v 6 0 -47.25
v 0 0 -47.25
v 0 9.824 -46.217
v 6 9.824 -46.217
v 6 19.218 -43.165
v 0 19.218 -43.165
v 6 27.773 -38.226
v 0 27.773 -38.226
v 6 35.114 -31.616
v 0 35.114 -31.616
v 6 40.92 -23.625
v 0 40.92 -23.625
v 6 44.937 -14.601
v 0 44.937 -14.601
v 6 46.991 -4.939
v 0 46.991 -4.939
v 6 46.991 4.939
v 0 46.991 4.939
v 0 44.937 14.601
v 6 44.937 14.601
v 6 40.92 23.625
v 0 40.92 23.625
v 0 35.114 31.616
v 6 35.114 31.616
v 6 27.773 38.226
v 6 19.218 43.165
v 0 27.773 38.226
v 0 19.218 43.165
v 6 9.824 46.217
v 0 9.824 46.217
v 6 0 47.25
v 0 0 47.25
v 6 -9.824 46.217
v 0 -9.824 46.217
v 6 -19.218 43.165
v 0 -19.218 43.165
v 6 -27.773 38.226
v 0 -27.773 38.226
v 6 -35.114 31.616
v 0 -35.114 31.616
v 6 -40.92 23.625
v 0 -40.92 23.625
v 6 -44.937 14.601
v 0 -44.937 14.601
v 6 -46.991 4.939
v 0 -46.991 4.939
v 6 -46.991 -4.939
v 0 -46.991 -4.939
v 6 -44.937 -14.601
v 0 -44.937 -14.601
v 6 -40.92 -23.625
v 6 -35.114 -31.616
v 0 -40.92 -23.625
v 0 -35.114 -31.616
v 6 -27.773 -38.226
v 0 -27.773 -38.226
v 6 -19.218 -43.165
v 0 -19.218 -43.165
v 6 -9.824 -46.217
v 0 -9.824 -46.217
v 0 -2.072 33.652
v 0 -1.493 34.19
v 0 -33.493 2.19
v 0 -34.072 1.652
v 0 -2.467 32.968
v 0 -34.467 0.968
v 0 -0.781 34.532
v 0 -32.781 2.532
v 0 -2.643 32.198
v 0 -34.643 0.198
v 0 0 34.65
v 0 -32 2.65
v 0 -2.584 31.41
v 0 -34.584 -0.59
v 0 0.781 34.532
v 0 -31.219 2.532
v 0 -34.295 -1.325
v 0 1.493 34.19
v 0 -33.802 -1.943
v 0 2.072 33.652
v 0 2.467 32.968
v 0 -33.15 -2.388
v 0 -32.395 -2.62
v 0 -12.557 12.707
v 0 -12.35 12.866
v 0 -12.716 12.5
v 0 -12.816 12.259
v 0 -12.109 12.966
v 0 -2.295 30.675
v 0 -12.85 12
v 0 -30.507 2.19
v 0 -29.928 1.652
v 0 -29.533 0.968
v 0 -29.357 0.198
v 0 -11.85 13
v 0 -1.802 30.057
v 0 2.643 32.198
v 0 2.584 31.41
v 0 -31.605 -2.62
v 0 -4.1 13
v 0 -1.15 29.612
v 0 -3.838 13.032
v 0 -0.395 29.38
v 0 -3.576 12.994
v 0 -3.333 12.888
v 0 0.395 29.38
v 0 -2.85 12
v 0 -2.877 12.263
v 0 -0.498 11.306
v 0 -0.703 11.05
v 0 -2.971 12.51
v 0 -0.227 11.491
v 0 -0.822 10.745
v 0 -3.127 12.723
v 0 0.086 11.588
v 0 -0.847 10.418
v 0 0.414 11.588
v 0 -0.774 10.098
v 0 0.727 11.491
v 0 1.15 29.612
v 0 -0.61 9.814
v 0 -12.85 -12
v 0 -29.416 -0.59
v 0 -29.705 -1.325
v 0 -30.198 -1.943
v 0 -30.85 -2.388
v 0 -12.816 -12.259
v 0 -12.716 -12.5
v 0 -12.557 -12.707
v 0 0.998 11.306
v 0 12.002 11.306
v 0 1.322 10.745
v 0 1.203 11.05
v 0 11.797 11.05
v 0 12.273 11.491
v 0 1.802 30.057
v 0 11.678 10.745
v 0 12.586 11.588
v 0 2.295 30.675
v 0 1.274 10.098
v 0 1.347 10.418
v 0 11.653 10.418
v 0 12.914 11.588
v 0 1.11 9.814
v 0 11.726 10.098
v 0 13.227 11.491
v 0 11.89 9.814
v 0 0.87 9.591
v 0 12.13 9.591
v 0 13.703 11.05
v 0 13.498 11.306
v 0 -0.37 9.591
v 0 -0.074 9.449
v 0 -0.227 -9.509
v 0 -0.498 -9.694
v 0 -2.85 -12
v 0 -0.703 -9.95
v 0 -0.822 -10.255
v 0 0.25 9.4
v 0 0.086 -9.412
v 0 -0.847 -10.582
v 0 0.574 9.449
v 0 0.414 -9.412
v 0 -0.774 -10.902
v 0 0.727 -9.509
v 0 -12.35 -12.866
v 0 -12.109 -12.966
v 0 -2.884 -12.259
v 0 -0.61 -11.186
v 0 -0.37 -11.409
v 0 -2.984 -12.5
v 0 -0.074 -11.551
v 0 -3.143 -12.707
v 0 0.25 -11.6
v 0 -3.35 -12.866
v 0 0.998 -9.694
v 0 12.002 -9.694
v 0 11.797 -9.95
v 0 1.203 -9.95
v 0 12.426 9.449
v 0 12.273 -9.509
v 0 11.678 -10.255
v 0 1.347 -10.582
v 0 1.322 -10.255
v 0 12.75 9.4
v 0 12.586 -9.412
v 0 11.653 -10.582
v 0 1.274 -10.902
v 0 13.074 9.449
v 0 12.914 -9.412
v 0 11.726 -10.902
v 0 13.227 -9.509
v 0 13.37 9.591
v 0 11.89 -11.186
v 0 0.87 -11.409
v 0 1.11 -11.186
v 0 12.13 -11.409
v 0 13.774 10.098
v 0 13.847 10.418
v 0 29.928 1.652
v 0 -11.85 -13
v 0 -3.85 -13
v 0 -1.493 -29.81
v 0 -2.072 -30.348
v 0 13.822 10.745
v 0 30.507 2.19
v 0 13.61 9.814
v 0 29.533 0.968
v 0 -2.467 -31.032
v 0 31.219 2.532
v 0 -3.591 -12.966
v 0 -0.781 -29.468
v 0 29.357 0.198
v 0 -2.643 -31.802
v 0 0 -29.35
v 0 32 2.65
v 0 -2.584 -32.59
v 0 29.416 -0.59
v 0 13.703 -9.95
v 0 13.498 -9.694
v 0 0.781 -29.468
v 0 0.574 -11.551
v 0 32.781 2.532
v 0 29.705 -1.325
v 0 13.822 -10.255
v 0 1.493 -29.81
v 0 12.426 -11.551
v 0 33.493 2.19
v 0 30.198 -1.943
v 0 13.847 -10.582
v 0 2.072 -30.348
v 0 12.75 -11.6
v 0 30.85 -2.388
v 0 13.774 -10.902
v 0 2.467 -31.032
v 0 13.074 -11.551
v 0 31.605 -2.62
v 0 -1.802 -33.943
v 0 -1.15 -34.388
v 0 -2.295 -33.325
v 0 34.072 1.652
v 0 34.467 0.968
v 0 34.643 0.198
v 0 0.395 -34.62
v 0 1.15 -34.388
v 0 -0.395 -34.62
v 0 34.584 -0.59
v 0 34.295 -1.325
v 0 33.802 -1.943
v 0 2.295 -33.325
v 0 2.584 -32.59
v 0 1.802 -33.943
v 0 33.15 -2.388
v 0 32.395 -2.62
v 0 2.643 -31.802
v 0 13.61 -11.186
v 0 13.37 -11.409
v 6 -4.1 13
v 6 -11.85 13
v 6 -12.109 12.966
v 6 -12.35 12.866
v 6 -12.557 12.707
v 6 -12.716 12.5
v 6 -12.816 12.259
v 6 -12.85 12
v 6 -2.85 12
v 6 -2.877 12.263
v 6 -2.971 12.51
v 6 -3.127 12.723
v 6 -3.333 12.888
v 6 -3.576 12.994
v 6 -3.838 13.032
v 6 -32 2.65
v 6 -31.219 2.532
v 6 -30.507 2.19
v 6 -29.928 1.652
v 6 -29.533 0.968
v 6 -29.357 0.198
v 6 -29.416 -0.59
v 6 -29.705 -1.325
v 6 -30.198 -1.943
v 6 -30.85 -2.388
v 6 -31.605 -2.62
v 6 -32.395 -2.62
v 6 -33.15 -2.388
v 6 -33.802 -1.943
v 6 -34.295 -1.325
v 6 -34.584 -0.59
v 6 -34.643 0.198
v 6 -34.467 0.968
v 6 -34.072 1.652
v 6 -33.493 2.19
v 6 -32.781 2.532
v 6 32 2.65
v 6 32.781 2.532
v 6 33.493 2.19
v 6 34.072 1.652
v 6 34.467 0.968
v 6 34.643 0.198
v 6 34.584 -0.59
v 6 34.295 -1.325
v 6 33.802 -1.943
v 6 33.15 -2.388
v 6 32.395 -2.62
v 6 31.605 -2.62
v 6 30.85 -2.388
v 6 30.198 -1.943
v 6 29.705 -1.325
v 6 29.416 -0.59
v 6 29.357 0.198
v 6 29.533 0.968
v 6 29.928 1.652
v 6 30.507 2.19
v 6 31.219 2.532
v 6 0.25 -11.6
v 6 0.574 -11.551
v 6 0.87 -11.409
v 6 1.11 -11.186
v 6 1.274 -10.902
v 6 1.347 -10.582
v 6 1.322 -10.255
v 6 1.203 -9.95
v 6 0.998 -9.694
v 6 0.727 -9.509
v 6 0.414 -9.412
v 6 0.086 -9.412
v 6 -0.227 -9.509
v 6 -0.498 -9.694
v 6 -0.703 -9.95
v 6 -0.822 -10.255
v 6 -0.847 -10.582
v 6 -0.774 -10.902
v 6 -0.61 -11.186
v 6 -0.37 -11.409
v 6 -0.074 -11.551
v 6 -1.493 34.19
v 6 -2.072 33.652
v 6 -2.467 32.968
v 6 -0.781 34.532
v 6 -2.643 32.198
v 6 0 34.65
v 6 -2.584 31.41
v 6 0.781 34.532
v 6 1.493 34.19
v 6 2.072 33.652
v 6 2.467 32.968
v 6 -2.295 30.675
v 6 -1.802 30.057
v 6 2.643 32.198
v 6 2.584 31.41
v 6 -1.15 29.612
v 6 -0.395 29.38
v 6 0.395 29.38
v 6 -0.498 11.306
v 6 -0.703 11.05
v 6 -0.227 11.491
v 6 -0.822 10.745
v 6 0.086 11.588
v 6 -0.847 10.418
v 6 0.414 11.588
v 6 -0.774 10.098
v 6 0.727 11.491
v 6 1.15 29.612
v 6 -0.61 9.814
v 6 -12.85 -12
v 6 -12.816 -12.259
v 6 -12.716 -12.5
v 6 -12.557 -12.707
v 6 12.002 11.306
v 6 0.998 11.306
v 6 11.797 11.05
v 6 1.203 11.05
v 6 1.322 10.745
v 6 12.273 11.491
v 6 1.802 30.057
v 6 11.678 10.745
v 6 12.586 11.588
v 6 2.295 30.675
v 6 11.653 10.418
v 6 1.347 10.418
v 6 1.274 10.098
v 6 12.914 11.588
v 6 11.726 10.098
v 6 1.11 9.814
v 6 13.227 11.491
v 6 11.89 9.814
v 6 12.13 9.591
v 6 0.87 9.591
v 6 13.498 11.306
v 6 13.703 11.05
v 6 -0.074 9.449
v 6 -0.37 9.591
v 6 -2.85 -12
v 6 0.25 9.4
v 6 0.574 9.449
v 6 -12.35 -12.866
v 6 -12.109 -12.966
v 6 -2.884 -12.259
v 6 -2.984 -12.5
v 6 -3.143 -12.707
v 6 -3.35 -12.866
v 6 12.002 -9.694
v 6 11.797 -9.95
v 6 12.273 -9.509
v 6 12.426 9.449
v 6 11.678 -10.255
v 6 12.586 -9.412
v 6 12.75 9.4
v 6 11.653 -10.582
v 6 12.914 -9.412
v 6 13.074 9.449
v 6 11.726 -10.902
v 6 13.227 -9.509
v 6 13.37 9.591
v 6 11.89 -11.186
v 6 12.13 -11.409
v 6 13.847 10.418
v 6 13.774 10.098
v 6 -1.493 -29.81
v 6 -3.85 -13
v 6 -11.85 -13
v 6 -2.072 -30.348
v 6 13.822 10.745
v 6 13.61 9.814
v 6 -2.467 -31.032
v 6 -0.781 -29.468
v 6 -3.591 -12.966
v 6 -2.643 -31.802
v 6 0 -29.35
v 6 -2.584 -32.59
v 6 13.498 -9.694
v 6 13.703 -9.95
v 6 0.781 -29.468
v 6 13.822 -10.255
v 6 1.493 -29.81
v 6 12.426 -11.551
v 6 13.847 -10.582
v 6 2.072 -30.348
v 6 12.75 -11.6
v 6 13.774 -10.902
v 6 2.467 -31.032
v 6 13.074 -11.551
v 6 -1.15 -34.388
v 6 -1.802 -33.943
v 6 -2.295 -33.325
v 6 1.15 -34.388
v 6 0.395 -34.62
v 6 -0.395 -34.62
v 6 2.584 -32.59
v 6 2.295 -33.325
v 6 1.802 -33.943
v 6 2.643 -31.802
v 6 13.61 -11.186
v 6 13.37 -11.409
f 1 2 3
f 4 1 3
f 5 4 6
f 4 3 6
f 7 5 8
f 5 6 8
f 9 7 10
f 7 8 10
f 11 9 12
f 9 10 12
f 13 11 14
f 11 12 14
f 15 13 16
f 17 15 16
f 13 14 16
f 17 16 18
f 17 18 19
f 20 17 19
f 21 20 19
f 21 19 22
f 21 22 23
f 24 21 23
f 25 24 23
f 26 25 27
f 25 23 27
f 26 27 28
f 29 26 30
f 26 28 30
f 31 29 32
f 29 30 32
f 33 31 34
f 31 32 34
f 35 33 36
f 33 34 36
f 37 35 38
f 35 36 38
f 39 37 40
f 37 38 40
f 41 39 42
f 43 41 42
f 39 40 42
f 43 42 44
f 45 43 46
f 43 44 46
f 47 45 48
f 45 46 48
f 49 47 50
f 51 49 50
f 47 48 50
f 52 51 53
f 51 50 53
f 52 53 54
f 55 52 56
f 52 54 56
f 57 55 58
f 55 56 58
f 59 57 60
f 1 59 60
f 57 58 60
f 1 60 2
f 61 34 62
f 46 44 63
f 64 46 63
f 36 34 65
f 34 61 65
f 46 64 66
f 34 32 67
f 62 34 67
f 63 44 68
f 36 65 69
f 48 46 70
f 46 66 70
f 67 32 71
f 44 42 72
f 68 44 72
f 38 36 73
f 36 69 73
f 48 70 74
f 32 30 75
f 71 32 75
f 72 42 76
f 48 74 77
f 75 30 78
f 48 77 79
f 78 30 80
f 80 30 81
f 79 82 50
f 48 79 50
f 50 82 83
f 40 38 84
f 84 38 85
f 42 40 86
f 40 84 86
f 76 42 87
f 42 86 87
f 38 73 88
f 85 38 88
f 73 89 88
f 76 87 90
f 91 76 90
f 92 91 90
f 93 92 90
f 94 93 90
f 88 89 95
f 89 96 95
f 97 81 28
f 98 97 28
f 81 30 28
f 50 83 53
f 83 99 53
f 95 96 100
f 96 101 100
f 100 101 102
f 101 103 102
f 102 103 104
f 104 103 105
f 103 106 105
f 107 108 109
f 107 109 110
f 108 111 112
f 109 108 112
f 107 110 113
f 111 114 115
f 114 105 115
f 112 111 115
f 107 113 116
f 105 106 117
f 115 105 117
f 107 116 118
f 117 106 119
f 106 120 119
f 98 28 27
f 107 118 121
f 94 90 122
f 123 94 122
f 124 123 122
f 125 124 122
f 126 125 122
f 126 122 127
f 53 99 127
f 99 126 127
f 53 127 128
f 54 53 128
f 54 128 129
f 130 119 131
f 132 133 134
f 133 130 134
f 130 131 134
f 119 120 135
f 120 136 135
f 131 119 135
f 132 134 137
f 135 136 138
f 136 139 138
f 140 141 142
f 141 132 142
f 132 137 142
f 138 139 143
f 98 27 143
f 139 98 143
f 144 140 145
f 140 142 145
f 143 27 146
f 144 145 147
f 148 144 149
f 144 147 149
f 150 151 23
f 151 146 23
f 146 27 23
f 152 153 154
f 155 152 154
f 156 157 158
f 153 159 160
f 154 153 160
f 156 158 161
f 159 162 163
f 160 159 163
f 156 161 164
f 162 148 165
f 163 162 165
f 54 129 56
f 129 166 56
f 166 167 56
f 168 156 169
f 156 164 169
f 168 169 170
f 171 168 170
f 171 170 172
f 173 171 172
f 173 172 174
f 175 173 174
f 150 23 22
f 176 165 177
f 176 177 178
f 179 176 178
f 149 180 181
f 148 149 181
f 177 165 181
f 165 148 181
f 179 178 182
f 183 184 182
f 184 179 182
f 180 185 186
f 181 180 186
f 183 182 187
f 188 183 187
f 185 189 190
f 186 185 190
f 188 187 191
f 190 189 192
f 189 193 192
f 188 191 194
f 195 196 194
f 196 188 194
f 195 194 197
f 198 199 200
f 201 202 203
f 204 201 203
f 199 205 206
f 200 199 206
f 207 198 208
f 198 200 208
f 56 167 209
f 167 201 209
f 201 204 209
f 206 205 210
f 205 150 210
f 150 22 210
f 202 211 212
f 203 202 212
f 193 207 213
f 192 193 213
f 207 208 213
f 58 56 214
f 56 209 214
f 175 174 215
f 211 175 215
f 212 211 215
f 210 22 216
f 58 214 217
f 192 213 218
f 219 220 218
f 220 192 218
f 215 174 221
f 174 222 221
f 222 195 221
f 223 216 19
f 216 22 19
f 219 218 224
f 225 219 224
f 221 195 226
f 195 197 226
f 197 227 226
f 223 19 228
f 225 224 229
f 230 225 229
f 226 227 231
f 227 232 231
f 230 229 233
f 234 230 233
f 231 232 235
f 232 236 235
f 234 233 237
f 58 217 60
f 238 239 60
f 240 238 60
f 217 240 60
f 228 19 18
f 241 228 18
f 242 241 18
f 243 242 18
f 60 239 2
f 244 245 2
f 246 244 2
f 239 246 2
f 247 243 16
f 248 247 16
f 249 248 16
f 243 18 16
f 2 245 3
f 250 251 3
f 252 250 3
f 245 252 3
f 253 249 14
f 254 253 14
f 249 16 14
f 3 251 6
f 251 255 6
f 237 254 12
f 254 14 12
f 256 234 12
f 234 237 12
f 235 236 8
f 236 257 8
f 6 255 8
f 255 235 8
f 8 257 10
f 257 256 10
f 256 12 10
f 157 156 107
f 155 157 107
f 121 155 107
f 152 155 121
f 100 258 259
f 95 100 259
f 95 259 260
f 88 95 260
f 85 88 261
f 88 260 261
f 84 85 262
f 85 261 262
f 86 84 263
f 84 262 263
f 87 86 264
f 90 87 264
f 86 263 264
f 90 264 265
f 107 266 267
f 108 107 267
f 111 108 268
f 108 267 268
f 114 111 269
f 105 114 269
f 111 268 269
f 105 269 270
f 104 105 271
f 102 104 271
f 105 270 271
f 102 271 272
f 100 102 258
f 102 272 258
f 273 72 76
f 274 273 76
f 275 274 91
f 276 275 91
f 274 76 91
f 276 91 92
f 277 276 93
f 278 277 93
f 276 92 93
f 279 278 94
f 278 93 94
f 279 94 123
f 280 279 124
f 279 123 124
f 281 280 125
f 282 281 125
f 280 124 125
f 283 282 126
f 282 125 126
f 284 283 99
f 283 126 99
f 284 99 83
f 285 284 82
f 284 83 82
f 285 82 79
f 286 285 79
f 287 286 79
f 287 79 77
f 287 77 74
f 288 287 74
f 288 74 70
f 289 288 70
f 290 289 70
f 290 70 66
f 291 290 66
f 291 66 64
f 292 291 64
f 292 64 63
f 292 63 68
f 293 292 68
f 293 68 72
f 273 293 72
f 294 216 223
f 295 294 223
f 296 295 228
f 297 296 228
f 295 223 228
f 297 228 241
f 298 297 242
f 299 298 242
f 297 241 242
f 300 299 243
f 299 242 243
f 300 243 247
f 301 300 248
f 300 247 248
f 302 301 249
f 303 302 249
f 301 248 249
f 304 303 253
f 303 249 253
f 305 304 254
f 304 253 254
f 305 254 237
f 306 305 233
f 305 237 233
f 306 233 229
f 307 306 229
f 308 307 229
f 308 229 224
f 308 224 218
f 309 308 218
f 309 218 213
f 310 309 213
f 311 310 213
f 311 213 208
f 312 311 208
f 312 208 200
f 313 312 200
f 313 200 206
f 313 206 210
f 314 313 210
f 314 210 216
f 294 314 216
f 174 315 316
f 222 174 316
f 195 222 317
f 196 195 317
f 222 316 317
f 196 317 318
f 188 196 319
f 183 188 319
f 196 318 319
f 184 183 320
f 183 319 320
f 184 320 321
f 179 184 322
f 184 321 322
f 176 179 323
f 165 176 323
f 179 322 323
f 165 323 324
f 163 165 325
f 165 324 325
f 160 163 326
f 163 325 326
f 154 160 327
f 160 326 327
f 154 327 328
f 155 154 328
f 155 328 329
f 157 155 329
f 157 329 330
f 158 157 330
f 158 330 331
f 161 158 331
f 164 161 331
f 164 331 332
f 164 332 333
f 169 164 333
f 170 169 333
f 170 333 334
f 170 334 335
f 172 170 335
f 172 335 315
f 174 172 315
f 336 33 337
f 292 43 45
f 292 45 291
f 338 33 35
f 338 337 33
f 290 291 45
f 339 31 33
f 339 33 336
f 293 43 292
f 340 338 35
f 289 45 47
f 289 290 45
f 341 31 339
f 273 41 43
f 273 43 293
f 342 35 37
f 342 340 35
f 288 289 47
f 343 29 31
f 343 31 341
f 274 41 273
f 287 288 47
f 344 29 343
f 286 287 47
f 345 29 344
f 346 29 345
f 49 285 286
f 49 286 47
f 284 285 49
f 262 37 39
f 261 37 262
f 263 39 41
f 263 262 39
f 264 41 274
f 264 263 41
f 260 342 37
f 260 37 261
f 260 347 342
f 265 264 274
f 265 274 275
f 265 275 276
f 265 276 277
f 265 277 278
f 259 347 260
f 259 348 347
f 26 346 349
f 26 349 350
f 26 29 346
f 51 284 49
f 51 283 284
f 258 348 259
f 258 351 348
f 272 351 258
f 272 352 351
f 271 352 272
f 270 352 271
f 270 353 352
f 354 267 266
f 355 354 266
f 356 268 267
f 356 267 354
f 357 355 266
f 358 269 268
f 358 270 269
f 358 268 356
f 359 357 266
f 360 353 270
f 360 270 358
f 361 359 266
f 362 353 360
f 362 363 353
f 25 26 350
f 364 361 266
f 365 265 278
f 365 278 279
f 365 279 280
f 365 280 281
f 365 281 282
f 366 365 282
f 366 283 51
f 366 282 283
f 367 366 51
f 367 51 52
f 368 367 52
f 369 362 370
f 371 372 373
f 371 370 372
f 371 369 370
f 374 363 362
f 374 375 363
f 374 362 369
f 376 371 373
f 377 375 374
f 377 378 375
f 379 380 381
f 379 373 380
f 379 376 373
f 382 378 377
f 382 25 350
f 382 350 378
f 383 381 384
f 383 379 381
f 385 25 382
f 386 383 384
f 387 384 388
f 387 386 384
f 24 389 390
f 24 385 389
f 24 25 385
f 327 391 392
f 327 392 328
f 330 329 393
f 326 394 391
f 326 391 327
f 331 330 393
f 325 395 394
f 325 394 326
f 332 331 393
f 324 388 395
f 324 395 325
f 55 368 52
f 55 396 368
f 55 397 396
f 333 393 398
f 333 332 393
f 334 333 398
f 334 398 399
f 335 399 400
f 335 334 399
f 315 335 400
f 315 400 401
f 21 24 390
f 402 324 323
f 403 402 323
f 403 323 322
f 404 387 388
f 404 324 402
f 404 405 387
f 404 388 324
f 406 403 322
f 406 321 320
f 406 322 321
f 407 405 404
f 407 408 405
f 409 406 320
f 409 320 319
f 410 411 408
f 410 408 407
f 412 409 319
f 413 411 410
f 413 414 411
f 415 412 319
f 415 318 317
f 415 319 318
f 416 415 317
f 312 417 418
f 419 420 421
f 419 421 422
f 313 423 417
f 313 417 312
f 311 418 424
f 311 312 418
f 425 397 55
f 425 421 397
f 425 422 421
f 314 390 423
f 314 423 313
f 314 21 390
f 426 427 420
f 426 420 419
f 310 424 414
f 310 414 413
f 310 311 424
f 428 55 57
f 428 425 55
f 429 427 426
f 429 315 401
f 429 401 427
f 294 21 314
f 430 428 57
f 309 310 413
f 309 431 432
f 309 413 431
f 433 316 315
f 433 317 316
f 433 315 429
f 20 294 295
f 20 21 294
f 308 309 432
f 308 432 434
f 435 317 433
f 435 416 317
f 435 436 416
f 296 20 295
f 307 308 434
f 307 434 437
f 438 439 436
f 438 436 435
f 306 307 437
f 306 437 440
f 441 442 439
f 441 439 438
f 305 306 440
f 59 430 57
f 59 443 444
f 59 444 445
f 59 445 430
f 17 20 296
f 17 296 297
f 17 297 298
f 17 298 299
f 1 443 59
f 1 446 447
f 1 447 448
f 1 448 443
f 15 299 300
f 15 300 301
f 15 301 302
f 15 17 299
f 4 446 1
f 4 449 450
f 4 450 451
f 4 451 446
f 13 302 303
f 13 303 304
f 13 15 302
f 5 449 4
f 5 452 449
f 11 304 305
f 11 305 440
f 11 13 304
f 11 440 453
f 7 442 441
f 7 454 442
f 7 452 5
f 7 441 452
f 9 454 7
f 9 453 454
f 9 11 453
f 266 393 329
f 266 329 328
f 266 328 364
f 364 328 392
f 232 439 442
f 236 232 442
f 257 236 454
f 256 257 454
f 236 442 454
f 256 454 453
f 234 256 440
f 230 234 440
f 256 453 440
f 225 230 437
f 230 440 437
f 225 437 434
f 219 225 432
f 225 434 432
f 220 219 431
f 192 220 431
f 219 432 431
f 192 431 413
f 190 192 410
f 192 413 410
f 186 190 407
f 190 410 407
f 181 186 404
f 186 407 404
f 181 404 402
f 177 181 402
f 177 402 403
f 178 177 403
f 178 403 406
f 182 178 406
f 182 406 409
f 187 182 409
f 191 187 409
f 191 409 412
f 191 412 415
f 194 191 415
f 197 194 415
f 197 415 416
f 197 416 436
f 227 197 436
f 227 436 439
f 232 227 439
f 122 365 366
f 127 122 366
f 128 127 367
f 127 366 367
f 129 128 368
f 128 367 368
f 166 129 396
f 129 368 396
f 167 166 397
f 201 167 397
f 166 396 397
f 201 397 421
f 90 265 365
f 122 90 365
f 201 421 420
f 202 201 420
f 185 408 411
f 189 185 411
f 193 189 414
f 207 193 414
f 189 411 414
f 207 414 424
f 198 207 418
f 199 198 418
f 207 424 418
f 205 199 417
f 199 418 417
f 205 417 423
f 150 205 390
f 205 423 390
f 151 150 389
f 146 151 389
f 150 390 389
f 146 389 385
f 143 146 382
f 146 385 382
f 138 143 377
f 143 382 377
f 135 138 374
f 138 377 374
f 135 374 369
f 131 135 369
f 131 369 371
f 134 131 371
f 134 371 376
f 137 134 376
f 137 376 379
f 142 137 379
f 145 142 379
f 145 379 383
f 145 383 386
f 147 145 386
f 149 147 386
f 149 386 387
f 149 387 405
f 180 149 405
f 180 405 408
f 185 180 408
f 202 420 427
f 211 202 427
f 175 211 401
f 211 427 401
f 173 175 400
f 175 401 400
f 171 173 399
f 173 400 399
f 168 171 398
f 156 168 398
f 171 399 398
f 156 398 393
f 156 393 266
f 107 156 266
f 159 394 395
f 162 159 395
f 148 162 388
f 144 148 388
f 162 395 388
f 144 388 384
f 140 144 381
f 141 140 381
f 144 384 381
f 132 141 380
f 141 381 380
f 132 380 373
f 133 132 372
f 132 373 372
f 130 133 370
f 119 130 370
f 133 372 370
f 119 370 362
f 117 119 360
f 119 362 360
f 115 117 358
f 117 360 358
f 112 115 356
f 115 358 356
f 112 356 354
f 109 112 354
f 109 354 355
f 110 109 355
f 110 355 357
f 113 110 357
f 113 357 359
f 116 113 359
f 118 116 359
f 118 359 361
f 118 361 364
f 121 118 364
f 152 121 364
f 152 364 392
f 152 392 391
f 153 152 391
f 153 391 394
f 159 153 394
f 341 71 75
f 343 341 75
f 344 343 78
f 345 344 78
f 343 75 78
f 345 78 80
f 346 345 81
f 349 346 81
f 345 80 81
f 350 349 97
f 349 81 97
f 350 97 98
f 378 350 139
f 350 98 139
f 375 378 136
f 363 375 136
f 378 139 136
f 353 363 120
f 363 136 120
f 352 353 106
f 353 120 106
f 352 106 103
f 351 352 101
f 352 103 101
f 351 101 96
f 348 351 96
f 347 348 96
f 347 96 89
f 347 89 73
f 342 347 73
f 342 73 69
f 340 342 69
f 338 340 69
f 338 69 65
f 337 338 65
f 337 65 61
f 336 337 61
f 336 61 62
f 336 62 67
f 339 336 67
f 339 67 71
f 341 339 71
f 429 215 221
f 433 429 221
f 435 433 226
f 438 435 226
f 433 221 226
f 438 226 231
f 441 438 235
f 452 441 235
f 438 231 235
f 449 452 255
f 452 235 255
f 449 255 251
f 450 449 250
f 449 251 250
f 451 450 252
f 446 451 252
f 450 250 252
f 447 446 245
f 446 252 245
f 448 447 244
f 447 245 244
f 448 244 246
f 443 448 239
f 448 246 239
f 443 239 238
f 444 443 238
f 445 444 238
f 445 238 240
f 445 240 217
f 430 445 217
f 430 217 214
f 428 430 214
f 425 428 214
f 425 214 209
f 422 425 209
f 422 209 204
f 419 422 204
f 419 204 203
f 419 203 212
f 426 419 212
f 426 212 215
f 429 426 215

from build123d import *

# Parameters (mm, degrees)
SKETCH1_R                = 47.25
BOSS_EXTRUDE1_DEPTH      = 6
SKETCH2_R                = 1.1
CUT_EXTRUDE1_DEPTH       = 20
M5_CLEARANCE_HOLE1_D     = 5.3
M5_CLEARANCE_HOLE1_DEPTH = 15
M5_CLEARANCE_HOLE1_TIP   = 1.59228064


with BuildPart() as part:
    # Sketch1 → Boss-Extrude1 (new body)
    with BuildSketch(Plane(origin=(0, 0, 0), x_dir=(0, 0, -1), z_dir=(1, 0, 0))):
        Circle(SKETCH1_R)
    extrude(amount=BOSS_EXTRUDE1_DEPTH)

    # Sketch2 → Cut-Extrude1 (cut)
    with BuildSketch(Plane(origin=(6, 0, 0), x_dir=(0, 0, -1), z_dir=(1, 0, 0))):
        with BuildLine():
            Line((12, -2.85), (-12, -2.85))
            ThreePointArc((-12, -2.85), (-12.812754403, -3.224796478), (-13, -4.1))
            Line((-13, -4.1), (-13, -11.85))
            ThreePointArc((-13, -11.85), (-12.707106781, -12.557106781), (-12, -12.85))
            Line((-12, -12.85), (12, -12.85))
            ThreePointArc((12, -12.85), (12.707106781, -12.557106781), (13, -11.85))
            Line((13, -11.85), (13, -3.85))
            ThreePointArc((13, -3.85), (12.707106781, -3.142893219), (12, -2.85))
        make_face()
        with Locations((-10.5, 12.75)):
            Circle(SKETCH2_R)
        with Locations((10.5, 12.75)):
            Circle(SKETCH2_R)
        with Locations((10.5, 0.25)):
            Circle(SKETCH2_R)
        with Locations((-10.5, 0.25)):
            Circle(SKETCH2_R)
    extrude(amount=-CUT_EXTRUDE1_DEPTH, mode=Mode.SUBTRACT)

    # M5 Clearance Hole1
    with Locations(Plane(origin=(6, 0, 0), x_dir=(0, 0, -1), z_dir=(1, 0, 0))):
        with Locations((-32, 0), (0, 32), (32, 0), (0, -32)):
            Hole(M5_CLEARANCE_HOLE1_D / 2, depth=M5_CLEARANCE_HOLE1_DEPTH)
            with Locations((0, 0, -(M5_CLEARANCE_HOLE1_DEPTH + M5_CLEARANCE_HOLE1_TIP / 2))):  # 118° drill point
                Cone(0, M5_CLEARANCE_HOLE1_D / 2, M5_CLEARANCE_HOLE1_TIP, mode=Mode.SUBTRACT)


solid = part.part
